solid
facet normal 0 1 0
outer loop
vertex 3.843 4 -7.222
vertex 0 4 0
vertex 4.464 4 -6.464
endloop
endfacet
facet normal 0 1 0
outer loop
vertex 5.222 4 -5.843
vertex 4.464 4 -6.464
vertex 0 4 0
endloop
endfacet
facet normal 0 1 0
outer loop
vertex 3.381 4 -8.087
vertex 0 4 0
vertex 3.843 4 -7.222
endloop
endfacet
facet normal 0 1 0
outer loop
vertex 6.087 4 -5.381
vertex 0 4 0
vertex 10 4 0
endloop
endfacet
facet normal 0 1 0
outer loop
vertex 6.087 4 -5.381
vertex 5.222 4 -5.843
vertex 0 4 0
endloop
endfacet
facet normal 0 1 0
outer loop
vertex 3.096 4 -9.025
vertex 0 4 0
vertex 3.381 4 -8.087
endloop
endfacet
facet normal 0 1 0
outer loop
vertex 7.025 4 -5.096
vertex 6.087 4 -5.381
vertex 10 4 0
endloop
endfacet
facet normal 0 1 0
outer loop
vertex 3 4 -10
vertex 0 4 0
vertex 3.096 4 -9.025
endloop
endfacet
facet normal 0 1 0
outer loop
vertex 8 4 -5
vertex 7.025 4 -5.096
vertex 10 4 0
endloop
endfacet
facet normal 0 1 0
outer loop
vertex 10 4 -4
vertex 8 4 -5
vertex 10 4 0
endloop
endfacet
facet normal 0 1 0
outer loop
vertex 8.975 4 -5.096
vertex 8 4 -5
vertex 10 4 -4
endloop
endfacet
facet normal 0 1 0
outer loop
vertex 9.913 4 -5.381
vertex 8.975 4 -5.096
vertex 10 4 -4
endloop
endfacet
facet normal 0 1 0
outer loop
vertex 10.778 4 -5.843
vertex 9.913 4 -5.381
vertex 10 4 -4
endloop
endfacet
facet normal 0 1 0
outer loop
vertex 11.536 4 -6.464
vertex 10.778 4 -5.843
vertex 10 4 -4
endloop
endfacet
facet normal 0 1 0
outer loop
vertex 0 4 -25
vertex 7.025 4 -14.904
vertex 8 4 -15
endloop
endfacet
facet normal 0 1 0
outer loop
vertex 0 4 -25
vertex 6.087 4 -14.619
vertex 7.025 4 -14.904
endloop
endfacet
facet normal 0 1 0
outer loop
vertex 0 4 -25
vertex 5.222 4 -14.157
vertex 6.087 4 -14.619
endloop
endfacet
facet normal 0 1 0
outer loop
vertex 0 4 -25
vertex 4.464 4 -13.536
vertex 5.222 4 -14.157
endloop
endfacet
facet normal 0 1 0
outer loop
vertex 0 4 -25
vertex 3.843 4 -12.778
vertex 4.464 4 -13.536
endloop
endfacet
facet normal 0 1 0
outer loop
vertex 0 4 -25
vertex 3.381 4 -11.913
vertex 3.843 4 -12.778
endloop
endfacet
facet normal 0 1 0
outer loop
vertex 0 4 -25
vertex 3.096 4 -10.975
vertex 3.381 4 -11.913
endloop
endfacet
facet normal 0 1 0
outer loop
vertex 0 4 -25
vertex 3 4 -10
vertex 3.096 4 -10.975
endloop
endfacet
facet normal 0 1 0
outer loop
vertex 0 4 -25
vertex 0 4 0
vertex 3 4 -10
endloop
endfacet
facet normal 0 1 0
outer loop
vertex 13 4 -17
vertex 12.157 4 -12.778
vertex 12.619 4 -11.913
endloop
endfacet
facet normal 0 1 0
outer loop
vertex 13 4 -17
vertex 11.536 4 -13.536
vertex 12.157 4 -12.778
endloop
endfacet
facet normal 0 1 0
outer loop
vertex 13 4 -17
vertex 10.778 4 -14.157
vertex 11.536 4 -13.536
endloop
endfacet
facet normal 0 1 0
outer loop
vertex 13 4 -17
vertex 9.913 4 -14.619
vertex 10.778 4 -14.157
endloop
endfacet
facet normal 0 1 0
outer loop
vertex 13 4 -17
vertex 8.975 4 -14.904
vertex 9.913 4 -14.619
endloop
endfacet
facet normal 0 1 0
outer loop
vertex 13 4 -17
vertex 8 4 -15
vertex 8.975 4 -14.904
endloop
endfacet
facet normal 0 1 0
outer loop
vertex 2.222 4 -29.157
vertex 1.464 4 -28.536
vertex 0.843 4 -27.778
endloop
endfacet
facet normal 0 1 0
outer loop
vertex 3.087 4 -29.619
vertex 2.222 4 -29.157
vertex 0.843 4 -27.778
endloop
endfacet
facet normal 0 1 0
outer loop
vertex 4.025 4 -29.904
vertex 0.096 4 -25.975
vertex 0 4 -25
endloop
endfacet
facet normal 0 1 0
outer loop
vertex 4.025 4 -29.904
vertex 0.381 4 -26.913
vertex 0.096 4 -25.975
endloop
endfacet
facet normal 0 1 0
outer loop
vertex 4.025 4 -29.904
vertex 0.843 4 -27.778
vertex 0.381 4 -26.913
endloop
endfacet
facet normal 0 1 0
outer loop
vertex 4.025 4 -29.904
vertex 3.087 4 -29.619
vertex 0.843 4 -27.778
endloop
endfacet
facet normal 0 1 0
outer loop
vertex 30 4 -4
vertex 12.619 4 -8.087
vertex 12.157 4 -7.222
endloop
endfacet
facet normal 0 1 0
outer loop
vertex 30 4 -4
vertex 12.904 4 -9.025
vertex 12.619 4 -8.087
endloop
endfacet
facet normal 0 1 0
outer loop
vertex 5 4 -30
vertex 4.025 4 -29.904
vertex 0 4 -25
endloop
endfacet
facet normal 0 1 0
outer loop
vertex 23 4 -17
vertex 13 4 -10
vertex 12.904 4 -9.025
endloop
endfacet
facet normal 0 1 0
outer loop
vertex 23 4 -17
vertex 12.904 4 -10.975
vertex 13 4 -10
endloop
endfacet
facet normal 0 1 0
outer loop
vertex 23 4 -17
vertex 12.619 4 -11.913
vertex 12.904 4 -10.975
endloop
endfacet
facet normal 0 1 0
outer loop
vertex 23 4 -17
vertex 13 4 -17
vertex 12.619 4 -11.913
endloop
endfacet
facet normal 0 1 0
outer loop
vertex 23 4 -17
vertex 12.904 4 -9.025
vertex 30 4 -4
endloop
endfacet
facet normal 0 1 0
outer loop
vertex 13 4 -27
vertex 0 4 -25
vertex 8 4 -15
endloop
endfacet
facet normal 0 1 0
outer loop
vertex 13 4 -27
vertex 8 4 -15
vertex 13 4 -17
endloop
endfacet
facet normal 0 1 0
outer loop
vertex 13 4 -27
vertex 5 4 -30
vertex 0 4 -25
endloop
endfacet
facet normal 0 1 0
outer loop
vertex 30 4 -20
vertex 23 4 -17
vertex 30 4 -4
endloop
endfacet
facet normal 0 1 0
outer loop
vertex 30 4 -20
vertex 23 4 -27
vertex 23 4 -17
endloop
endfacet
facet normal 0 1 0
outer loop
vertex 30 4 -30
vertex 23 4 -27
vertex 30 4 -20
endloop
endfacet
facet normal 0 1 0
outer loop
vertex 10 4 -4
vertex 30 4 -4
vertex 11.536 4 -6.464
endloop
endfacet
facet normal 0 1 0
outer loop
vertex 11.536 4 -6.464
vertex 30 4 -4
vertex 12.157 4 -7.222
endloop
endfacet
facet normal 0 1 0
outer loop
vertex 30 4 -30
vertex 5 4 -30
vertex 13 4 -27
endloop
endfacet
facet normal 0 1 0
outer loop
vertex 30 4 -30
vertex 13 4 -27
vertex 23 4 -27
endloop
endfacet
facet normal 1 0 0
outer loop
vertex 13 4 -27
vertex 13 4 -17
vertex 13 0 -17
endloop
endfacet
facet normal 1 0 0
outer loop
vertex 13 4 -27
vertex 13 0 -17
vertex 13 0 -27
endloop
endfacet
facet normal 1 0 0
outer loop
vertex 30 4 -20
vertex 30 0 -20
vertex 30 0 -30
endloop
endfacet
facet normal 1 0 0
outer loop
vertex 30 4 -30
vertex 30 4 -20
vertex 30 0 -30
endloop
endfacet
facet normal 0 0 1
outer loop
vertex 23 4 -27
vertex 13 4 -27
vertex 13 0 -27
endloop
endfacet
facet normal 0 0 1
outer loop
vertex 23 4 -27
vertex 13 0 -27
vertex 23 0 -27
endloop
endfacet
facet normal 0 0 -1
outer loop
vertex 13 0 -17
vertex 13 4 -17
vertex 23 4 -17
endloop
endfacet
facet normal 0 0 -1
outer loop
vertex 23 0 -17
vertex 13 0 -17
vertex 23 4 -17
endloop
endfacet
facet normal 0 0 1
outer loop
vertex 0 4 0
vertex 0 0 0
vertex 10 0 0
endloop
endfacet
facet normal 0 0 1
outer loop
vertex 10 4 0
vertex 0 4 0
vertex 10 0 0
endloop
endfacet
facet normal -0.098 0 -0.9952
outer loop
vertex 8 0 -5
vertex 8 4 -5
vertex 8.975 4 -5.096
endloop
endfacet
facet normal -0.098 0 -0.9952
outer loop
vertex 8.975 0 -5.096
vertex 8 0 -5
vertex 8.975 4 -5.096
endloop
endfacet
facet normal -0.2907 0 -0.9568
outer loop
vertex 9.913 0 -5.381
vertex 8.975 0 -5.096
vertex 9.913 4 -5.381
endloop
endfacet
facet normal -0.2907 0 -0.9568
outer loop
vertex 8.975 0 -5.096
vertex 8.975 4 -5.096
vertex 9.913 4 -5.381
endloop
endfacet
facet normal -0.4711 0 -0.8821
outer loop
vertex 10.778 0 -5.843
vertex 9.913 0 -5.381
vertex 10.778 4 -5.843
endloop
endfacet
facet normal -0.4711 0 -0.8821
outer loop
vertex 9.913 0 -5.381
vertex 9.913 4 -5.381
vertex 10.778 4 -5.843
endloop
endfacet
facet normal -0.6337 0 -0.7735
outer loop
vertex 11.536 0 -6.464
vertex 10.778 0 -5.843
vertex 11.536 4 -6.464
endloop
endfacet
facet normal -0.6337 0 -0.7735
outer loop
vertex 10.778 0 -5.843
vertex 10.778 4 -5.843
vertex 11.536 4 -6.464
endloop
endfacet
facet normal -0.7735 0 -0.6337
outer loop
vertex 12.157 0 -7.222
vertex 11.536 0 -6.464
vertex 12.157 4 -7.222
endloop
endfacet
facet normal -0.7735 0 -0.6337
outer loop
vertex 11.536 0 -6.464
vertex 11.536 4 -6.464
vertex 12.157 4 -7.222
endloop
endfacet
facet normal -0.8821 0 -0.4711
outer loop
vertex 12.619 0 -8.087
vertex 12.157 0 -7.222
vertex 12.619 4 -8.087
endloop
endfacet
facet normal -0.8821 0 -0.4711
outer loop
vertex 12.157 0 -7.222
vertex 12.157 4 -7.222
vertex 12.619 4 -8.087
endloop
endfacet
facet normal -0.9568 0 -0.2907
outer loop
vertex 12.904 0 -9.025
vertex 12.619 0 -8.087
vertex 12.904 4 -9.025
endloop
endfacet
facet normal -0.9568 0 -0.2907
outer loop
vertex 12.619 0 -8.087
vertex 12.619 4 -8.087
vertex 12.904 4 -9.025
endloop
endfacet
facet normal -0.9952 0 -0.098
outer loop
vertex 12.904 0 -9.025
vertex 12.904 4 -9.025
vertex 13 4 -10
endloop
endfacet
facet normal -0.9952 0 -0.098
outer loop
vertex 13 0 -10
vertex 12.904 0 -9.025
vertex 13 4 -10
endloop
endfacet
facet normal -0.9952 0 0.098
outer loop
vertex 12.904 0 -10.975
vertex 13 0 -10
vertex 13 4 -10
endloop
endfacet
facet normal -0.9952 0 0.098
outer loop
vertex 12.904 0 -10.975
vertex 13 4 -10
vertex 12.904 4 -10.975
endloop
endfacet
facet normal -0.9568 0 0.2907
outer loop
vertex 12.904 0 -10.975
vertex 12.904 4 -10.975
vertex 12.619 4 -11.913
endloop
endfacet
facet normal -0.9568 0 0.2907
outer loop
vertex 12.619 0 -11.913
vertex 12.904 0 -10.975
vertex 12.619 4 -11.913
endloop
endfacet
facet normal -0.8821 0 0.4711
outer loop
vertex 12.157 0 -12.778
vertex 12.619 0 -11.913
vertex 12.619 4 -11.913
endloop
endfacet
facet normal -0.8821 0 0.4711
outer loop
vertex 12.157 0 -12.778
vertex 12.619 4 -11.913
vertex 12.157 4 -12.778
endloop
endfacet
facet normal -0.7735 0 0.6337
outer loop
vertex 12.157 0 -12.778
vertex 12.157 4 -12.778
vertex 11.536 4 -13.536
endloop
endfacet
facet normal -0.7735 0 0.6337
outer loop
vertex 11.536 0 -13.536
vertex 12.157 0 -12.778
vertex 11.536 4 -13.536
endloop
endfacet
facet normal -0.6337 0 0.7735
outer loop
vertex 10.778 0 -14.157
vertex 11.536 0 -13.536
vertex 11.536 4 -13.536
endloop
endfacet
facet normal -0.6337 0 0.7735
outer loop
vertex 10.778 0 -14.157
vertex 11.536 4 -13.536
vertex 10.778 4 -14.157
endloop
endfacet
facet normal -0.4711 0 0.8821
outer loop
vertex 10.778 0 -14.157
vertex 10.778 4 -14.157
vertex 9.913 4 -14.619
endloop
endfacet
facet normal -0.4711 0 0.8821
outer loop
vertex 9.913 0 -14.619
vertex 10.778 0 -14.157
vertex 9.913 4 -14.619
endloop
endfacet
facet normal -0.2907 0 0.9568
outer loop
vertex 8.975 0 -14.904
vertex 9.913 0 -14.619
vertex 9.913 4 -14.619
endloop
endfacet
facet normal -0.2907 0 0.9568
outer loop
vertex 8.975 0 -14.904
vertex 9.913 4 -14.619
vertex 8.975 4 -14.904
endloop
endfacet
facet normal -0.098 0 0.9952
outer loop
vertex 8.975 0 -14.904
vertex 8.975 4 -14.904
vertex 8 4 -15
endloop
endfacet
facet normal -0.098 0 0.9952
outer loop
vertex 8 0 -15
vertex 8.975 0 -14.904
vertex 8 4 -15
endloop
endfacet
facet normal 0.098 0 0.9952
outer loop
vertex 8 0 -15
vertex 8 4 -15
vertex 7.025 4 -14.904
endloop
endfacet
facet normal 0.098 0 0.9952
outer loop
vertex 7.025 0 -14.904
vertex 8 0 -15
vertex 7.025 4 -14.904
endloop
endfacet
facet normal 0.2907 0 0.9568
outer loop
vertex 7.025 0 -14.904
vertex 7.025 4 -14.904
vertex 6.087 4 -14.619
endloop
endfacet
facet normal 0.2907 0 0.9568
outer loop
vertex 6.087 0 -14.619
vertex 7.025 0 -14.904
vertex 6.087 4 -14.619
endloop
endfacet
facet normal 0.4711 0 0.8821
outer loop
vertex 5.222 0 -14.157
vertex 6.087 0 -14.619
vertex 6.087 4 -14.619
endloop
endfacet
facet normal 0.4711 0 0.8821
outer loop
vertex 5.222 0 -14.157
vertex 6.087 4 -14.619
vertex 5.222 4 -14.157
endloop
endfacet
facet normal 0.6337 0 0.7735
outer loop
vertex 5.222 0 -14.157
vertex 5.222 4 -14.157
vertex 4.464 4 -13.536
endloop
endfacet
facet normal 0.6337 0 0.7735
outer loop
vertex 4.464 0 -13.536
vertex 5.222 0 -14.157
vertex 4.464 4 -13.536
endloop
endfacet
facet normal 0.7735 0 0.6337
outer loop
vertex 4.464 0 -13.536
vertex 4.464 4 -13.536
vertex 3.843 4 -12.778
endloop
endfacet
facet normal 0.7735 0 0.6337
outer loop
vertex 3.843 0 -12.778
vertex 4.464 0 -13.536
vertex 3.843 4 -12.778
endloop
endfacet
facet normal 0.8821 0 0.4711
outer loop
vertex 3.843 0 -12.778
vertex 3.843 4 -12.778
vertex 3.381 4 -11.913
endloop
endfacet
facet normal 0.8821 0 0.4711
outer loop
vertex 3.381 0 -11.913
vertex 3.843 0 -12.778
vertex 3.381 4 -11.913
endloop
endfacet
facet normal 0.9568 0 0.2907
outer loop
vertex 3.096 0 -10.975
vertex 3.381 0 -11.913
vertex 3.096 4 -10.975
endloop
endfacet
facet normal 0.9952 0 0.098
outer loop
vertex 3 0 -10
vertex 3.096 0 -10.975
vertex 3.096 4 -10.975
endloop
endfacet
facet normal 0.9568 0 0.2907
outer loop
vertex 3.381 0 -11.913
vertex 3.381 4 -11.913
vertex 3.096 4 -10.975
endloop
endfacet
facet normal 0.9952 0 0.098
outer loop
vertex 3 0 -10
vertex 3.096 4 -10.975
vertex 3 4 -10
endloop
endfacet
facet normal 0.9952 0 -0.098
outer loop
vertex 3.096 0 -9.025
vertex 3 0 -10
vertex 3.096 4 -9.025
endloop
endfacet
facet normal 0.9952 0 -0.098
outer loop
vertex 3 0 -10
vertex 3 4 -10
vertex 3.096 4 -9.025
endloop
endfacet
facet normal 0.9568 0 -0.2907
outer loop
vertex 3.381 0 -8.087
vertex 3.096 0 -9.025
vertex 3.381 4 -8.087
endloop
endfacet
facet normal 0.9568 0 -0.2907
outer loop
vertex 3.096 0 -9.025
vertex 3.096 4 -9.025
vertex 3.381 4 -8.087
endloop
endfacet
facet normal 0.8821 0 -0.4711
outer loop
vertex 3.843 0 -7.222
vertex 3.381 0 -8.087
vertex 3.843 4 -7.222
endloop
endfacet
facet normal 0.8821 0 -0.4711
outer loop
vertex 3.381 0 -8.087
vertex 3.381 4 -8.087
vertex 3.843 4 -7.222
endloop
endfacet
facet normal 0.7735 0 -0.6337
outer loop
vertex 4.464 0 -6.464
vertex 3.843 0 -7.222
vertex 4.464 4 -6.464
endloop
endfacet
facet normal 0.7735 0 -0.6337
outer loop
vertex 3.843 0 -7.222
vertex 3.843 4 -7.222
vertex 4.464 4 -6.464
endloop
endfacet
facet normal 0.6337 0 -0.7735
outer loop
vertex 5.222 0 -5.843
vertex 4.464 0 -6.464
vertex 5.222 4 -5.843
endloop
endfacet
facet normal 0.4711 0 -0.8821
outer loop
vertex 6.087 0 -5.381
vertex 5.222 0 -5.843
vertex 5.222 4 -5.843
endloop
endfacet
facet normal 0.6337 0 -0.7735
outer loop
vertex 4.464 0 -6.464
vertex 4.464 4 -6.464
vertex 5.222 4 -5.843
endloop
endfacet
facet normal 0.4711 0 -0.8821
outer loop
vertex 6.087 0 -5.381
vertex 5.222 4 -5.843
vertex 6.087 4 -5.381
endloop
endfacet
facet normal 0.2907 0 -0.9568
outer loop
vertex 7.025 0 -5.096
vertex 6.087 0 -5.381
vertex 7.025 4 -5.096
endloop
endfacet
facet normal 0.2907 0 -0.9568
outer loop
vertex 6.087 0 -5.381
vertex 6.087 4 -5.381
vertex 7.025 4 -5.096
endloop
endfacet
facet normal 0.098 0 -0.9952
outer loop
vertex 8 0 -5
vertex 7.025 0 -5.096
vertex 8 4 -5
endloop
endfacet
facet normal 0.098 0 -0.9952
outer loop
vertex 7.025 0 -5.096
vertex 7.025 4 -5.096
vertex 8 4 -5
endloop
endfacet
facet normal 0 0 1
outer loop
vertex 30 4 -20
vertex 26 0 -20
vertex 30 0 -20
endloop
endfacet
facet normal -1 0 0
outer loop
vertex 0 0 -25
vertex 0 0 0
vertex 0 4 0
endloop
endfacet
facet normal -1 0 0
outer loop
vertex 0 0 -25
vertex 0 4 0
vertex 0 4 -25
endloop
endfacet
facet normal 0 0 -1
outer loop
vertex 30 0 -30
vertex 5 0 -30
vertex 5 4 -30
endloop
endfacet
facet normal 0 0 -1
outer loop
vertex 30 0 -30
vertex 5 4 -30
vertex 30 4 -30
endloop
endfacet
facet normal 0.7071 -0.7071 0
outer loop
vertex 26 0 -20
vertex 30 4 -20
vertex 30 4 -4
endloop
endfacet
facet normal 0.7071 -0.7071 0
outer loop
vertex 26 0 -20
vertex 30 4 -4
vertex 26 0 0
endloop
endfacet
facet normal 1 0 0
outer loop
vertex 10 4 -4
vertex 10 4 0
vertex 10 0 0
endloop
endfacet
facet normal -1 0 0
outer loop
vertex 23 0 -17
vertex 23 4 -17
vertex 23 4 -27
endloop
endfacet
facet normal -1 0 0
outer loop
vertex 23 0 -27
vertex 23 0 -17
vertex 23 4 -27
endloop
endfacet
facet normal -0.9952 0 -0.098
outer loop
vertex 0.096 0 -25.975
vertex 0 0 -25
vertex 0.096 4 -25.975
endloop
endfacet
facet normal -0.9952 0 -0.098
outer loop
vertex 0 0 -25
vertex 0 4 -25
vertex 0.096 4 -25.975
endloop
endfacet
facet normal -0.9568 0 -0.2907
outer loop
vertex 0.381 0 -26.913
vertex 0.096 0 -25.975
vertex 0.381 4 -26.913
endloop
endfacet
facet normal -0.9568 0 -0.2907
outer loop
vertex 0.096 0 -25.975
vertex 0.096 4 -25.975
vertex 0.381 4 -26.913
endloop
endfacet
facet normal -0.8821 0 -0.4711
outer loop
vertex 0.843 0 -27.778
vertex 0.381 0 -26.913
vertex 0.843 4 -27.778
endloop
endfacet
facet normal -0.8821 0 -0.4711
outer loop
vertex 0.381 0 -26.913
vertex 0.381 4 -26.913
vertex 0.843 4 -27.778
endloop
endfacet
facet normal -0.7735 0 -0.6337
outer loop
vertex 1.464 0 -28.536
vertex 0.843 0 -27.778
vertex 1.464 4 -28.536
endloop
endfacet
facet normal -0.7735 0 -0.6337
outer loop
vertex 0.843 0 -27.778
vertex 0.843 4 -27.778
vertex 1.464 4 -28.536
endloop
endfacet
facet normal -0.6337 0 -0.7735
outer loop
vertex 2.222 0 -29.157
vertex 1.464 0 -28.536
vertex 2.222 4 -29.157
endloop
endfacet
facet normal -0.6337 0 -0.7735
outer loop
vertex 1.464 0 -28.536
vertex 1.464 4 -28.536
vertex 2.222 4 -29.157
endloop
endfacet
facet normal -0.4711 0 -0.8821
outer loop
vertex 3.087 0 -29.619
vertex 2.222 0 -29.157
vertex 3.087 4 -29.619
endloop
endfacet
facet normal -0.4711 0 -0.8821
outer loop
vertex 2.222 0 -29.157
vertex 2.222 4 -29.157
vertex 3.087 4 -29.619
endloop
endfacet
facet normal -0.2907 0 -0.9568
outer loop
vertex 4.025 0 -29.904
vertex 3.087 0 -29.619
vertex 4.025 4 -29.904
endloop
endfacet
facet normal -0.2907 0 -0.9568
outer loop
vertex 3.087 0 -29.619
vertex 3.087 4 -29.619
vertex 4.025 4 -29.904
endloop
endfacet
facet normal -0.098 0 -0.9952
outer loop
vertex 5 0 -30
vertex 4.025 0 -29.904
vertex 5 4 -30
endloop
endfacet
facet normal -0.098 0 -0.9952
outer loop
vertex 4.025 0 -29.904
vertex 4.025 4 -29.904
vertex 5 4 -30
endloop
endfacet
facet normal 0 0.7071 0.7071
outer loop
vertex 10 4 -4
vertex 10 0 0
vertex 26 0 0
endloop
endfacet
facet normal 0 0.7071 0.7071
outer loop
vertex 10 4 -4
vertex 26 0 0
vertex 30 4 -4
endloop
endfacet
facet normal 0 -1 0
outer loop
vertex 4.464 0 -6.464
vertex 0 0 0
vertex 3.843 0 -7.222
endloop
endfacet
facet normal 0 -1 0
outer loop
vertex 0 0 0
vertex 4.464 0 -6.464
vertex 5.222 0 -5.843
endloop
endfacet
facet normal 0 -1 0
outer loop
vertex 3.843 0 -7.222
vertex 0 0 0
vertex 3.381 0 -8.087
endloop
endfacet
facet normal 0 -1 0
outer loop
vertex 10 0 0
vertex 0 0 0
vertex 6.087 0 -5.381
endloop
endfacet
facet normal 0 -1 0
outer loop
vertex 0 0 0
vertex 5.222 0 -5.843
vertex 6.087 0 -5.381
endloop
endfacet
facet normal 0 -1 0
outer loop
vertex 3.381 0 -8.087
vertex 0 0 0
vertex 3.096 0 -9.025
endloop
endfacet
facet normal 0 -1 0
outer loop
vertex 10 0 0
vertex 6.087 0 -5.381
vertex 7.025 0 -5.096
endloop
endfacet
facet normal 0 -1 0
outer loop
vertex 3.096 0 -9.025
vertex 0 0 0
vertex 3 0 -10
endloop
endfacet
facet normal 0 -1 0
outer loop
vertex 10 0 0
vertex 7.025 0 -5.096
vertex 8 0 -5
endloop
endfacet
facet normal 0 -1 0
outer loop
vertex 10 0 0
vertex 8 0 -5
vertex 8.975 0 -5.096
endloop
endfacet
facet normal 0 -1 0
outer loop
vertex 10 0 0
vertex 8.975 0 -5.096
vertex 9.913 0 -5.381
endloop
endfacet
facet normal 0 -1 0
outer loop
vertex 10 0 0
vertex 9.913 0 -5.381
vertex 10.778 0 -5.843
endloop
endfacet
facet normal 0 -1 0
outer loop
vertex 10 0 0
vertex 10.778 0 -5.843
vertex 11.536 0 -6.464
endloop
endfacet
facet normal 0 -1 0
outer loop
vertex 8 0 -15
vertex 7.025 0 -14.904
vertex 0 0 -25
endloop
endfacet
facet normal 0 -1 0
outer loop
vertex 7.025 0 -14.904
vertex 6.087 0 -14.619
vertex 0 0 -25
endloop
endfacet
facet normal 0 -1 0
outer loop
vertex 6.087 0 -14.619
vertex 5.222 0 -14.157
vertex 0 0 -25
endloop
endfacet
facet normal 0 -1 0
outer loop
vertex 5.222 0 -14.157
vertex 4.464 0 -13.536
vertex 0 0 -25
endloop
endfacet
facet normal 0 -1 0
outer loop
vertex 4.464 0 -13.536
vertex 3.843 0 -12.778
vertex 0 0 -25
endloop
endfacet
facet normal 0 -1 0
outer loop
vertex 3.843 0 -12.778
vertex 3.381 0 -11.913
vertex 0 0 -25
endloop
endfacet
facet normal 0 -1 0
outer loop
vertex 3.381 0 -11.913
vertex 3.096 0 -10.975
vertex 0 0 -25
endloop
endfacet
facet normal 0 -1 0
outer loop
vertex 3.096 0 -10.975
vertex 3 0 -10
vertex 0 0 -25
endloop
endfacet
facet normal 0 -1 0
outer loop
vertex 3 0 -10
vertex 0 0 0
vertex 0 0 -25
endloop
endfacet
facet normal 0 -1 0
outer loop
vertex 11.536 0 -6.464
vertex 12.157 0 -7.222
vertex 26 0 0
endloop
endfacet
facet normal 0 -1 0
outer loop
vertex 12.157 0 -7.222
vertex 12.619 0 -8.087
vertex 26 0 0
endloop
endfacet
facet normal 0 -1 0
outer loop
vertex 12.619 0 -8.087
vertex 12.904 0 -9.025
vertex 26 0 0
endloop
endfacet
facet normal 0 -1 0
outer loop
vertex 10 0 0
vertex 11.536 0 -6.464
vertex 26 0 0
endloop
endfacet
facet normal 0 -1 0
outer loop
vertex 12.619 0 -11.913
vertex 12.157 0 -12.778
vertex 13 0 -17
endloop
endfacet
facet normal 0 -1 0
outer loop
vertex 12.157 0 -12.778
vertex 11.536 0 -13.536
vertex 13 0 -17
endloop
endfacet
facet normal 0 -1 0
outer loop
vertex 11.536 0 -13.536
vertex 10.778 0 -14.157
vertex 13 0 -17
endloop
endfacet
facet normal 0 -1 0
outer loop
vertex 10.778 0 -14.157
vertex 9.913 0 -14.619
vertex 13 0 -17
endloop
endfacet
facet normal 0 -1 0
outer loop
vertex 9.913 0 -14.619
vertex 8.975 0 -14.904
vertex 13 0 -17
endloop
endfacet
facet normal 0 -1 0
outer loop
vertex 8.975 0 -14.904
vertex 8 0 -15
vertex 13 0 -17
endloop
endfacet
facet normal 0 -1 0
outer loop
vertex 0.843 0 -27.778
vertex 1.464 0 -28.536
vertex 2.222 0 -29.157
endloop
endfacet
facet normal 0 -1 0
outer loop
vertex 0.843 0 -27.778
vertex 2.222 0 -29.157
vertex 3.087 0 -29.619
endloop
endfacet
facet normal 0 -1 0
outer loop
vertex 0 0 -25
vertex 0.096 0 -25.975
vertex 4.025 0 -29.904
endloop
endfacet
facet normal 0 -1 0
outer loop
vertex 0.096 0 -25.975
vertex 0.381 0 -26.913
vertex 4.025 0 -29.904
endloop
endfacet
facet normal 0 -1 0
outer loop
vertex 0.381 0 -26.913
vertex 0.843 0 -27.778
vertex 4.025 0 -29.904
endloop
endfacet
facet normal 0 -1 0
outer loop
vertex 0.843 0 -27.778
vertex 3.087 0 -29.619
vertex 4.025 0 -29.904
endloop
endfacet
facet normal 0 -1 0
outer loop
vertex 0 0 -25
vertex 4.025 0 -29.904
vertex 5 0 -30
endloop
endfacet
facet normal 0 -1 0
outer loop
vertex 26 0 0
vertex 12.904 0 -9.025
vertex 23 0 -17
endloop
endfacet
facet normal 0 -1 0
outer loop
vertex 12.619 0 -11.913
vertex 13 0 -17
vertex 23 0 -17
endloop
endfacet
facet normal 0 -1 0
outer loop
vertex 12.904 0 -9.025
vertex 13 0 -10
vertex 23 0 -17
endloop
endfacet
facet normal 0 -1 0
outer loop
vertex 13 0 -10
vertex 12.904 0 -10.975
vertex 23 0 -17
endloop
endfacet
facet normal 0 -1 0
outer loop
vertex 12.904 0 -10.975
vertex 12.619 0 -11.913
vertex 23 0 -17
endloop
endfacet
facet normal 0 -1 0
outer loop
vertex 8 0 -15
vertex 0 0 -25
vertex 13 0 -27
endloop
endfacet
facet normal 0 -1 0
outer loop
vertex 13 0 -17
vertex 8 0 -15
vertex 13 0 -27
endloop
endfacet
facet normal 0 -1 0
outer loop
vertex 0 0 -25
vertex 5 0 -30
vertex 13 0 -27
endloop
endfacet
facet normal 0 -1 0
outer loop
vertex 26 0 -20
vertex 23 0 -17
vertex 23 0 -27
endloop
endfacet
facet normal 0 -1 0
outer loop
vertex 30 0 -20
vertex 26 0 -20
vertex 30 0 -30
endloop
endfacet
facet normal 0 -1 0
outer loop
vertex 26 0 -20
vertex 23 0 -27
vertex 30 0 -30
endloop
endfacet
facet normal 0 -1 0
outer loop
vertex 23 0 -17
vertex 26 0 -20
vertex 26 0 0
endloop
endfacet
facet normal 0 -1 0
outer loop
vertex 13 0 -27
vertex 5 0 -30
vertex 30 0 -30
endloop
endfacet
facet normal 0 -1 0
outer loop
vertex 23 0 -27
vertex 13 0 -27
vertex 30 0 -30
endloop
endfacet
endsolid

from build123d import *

# Parameters (mm, degrees)
SKETCH1_W           = 30
SKETCH1_H           = 30
BOSS_EXTRUDE1_DEPTH = 4
SKETCH2_R           = 5
SKETCH2_W           = 10
SKETCH2_H           = 10
CUT_EXTRUDE1_DEPTH  = 5
FILLET1_R           = 5
CUT_EXTRUDE2_DEPTH  = 20
CUT_EXTRUDE3_DEPTH  = 20


with BuildPart() as part:
    # Sketch1 → Boss-Extrude1 (new body)
    with BuildSketch(Plane(origin=(0, 0, 0), x_dir=(1, 0, 0), z_dir=(0, 1, 0))):
        with Locations((15, 15)):
            Rectangle(SKETCH1_W, SKETCH1_H)
    extrude(amount=BOSS_EXTRUDE1_DEPTH)

    # Sketch2 → Cut-Extrude1 (cut, through all)
    with BuildSketch(Plane(origin=(0, 4, 0), x_dir=(1, 0, 0), z_dir=(0, 1, 0))):
        with Locations(Location((8, 10, 0), (0, 0, 270))):  # turned: the seam where the file's is
            Circle(SKETCH2_R)
        with Locations((18, 22)):
            Rectangle(SKETCH2_W, SKETCH2_H)
    extrude(amount=-CUT_EXTRUDE1_DEPTH, mode=Mode.SUBTRACT)

    # Fillet1
    fillet1_edges = [part.edges().sort_by_distance(p)[0] for p in [
        (0, 2, -30),
    ]]
    fillet(fillet1_edges, radius=FILLET1_R)

    # Sketch3 → Cut-Extrude2 (cut)
    with BuildSketch(Plane(origin=(30, 0, 0), x_dir=(0, 0, -1), z_dir=(1, 0, 0))):
        Polygon((0, 0), (4, 4), (0, 4), align=None)
    extrude(amount=-CUT_EXTRUDE2_DEPTH, mode=Mode.SUBTRACT)

    # Sketch4 → Cut-Extrude3 (cut)
    with BuildSketch(Plane.XY):
        Polygon((30, 4), (26, 0), (30, 0), align=None)
    extrude(amount=-CUT_EXTRUDE3_DEPTH, mode=Mode.SUBTRACT)


solid = part.part
